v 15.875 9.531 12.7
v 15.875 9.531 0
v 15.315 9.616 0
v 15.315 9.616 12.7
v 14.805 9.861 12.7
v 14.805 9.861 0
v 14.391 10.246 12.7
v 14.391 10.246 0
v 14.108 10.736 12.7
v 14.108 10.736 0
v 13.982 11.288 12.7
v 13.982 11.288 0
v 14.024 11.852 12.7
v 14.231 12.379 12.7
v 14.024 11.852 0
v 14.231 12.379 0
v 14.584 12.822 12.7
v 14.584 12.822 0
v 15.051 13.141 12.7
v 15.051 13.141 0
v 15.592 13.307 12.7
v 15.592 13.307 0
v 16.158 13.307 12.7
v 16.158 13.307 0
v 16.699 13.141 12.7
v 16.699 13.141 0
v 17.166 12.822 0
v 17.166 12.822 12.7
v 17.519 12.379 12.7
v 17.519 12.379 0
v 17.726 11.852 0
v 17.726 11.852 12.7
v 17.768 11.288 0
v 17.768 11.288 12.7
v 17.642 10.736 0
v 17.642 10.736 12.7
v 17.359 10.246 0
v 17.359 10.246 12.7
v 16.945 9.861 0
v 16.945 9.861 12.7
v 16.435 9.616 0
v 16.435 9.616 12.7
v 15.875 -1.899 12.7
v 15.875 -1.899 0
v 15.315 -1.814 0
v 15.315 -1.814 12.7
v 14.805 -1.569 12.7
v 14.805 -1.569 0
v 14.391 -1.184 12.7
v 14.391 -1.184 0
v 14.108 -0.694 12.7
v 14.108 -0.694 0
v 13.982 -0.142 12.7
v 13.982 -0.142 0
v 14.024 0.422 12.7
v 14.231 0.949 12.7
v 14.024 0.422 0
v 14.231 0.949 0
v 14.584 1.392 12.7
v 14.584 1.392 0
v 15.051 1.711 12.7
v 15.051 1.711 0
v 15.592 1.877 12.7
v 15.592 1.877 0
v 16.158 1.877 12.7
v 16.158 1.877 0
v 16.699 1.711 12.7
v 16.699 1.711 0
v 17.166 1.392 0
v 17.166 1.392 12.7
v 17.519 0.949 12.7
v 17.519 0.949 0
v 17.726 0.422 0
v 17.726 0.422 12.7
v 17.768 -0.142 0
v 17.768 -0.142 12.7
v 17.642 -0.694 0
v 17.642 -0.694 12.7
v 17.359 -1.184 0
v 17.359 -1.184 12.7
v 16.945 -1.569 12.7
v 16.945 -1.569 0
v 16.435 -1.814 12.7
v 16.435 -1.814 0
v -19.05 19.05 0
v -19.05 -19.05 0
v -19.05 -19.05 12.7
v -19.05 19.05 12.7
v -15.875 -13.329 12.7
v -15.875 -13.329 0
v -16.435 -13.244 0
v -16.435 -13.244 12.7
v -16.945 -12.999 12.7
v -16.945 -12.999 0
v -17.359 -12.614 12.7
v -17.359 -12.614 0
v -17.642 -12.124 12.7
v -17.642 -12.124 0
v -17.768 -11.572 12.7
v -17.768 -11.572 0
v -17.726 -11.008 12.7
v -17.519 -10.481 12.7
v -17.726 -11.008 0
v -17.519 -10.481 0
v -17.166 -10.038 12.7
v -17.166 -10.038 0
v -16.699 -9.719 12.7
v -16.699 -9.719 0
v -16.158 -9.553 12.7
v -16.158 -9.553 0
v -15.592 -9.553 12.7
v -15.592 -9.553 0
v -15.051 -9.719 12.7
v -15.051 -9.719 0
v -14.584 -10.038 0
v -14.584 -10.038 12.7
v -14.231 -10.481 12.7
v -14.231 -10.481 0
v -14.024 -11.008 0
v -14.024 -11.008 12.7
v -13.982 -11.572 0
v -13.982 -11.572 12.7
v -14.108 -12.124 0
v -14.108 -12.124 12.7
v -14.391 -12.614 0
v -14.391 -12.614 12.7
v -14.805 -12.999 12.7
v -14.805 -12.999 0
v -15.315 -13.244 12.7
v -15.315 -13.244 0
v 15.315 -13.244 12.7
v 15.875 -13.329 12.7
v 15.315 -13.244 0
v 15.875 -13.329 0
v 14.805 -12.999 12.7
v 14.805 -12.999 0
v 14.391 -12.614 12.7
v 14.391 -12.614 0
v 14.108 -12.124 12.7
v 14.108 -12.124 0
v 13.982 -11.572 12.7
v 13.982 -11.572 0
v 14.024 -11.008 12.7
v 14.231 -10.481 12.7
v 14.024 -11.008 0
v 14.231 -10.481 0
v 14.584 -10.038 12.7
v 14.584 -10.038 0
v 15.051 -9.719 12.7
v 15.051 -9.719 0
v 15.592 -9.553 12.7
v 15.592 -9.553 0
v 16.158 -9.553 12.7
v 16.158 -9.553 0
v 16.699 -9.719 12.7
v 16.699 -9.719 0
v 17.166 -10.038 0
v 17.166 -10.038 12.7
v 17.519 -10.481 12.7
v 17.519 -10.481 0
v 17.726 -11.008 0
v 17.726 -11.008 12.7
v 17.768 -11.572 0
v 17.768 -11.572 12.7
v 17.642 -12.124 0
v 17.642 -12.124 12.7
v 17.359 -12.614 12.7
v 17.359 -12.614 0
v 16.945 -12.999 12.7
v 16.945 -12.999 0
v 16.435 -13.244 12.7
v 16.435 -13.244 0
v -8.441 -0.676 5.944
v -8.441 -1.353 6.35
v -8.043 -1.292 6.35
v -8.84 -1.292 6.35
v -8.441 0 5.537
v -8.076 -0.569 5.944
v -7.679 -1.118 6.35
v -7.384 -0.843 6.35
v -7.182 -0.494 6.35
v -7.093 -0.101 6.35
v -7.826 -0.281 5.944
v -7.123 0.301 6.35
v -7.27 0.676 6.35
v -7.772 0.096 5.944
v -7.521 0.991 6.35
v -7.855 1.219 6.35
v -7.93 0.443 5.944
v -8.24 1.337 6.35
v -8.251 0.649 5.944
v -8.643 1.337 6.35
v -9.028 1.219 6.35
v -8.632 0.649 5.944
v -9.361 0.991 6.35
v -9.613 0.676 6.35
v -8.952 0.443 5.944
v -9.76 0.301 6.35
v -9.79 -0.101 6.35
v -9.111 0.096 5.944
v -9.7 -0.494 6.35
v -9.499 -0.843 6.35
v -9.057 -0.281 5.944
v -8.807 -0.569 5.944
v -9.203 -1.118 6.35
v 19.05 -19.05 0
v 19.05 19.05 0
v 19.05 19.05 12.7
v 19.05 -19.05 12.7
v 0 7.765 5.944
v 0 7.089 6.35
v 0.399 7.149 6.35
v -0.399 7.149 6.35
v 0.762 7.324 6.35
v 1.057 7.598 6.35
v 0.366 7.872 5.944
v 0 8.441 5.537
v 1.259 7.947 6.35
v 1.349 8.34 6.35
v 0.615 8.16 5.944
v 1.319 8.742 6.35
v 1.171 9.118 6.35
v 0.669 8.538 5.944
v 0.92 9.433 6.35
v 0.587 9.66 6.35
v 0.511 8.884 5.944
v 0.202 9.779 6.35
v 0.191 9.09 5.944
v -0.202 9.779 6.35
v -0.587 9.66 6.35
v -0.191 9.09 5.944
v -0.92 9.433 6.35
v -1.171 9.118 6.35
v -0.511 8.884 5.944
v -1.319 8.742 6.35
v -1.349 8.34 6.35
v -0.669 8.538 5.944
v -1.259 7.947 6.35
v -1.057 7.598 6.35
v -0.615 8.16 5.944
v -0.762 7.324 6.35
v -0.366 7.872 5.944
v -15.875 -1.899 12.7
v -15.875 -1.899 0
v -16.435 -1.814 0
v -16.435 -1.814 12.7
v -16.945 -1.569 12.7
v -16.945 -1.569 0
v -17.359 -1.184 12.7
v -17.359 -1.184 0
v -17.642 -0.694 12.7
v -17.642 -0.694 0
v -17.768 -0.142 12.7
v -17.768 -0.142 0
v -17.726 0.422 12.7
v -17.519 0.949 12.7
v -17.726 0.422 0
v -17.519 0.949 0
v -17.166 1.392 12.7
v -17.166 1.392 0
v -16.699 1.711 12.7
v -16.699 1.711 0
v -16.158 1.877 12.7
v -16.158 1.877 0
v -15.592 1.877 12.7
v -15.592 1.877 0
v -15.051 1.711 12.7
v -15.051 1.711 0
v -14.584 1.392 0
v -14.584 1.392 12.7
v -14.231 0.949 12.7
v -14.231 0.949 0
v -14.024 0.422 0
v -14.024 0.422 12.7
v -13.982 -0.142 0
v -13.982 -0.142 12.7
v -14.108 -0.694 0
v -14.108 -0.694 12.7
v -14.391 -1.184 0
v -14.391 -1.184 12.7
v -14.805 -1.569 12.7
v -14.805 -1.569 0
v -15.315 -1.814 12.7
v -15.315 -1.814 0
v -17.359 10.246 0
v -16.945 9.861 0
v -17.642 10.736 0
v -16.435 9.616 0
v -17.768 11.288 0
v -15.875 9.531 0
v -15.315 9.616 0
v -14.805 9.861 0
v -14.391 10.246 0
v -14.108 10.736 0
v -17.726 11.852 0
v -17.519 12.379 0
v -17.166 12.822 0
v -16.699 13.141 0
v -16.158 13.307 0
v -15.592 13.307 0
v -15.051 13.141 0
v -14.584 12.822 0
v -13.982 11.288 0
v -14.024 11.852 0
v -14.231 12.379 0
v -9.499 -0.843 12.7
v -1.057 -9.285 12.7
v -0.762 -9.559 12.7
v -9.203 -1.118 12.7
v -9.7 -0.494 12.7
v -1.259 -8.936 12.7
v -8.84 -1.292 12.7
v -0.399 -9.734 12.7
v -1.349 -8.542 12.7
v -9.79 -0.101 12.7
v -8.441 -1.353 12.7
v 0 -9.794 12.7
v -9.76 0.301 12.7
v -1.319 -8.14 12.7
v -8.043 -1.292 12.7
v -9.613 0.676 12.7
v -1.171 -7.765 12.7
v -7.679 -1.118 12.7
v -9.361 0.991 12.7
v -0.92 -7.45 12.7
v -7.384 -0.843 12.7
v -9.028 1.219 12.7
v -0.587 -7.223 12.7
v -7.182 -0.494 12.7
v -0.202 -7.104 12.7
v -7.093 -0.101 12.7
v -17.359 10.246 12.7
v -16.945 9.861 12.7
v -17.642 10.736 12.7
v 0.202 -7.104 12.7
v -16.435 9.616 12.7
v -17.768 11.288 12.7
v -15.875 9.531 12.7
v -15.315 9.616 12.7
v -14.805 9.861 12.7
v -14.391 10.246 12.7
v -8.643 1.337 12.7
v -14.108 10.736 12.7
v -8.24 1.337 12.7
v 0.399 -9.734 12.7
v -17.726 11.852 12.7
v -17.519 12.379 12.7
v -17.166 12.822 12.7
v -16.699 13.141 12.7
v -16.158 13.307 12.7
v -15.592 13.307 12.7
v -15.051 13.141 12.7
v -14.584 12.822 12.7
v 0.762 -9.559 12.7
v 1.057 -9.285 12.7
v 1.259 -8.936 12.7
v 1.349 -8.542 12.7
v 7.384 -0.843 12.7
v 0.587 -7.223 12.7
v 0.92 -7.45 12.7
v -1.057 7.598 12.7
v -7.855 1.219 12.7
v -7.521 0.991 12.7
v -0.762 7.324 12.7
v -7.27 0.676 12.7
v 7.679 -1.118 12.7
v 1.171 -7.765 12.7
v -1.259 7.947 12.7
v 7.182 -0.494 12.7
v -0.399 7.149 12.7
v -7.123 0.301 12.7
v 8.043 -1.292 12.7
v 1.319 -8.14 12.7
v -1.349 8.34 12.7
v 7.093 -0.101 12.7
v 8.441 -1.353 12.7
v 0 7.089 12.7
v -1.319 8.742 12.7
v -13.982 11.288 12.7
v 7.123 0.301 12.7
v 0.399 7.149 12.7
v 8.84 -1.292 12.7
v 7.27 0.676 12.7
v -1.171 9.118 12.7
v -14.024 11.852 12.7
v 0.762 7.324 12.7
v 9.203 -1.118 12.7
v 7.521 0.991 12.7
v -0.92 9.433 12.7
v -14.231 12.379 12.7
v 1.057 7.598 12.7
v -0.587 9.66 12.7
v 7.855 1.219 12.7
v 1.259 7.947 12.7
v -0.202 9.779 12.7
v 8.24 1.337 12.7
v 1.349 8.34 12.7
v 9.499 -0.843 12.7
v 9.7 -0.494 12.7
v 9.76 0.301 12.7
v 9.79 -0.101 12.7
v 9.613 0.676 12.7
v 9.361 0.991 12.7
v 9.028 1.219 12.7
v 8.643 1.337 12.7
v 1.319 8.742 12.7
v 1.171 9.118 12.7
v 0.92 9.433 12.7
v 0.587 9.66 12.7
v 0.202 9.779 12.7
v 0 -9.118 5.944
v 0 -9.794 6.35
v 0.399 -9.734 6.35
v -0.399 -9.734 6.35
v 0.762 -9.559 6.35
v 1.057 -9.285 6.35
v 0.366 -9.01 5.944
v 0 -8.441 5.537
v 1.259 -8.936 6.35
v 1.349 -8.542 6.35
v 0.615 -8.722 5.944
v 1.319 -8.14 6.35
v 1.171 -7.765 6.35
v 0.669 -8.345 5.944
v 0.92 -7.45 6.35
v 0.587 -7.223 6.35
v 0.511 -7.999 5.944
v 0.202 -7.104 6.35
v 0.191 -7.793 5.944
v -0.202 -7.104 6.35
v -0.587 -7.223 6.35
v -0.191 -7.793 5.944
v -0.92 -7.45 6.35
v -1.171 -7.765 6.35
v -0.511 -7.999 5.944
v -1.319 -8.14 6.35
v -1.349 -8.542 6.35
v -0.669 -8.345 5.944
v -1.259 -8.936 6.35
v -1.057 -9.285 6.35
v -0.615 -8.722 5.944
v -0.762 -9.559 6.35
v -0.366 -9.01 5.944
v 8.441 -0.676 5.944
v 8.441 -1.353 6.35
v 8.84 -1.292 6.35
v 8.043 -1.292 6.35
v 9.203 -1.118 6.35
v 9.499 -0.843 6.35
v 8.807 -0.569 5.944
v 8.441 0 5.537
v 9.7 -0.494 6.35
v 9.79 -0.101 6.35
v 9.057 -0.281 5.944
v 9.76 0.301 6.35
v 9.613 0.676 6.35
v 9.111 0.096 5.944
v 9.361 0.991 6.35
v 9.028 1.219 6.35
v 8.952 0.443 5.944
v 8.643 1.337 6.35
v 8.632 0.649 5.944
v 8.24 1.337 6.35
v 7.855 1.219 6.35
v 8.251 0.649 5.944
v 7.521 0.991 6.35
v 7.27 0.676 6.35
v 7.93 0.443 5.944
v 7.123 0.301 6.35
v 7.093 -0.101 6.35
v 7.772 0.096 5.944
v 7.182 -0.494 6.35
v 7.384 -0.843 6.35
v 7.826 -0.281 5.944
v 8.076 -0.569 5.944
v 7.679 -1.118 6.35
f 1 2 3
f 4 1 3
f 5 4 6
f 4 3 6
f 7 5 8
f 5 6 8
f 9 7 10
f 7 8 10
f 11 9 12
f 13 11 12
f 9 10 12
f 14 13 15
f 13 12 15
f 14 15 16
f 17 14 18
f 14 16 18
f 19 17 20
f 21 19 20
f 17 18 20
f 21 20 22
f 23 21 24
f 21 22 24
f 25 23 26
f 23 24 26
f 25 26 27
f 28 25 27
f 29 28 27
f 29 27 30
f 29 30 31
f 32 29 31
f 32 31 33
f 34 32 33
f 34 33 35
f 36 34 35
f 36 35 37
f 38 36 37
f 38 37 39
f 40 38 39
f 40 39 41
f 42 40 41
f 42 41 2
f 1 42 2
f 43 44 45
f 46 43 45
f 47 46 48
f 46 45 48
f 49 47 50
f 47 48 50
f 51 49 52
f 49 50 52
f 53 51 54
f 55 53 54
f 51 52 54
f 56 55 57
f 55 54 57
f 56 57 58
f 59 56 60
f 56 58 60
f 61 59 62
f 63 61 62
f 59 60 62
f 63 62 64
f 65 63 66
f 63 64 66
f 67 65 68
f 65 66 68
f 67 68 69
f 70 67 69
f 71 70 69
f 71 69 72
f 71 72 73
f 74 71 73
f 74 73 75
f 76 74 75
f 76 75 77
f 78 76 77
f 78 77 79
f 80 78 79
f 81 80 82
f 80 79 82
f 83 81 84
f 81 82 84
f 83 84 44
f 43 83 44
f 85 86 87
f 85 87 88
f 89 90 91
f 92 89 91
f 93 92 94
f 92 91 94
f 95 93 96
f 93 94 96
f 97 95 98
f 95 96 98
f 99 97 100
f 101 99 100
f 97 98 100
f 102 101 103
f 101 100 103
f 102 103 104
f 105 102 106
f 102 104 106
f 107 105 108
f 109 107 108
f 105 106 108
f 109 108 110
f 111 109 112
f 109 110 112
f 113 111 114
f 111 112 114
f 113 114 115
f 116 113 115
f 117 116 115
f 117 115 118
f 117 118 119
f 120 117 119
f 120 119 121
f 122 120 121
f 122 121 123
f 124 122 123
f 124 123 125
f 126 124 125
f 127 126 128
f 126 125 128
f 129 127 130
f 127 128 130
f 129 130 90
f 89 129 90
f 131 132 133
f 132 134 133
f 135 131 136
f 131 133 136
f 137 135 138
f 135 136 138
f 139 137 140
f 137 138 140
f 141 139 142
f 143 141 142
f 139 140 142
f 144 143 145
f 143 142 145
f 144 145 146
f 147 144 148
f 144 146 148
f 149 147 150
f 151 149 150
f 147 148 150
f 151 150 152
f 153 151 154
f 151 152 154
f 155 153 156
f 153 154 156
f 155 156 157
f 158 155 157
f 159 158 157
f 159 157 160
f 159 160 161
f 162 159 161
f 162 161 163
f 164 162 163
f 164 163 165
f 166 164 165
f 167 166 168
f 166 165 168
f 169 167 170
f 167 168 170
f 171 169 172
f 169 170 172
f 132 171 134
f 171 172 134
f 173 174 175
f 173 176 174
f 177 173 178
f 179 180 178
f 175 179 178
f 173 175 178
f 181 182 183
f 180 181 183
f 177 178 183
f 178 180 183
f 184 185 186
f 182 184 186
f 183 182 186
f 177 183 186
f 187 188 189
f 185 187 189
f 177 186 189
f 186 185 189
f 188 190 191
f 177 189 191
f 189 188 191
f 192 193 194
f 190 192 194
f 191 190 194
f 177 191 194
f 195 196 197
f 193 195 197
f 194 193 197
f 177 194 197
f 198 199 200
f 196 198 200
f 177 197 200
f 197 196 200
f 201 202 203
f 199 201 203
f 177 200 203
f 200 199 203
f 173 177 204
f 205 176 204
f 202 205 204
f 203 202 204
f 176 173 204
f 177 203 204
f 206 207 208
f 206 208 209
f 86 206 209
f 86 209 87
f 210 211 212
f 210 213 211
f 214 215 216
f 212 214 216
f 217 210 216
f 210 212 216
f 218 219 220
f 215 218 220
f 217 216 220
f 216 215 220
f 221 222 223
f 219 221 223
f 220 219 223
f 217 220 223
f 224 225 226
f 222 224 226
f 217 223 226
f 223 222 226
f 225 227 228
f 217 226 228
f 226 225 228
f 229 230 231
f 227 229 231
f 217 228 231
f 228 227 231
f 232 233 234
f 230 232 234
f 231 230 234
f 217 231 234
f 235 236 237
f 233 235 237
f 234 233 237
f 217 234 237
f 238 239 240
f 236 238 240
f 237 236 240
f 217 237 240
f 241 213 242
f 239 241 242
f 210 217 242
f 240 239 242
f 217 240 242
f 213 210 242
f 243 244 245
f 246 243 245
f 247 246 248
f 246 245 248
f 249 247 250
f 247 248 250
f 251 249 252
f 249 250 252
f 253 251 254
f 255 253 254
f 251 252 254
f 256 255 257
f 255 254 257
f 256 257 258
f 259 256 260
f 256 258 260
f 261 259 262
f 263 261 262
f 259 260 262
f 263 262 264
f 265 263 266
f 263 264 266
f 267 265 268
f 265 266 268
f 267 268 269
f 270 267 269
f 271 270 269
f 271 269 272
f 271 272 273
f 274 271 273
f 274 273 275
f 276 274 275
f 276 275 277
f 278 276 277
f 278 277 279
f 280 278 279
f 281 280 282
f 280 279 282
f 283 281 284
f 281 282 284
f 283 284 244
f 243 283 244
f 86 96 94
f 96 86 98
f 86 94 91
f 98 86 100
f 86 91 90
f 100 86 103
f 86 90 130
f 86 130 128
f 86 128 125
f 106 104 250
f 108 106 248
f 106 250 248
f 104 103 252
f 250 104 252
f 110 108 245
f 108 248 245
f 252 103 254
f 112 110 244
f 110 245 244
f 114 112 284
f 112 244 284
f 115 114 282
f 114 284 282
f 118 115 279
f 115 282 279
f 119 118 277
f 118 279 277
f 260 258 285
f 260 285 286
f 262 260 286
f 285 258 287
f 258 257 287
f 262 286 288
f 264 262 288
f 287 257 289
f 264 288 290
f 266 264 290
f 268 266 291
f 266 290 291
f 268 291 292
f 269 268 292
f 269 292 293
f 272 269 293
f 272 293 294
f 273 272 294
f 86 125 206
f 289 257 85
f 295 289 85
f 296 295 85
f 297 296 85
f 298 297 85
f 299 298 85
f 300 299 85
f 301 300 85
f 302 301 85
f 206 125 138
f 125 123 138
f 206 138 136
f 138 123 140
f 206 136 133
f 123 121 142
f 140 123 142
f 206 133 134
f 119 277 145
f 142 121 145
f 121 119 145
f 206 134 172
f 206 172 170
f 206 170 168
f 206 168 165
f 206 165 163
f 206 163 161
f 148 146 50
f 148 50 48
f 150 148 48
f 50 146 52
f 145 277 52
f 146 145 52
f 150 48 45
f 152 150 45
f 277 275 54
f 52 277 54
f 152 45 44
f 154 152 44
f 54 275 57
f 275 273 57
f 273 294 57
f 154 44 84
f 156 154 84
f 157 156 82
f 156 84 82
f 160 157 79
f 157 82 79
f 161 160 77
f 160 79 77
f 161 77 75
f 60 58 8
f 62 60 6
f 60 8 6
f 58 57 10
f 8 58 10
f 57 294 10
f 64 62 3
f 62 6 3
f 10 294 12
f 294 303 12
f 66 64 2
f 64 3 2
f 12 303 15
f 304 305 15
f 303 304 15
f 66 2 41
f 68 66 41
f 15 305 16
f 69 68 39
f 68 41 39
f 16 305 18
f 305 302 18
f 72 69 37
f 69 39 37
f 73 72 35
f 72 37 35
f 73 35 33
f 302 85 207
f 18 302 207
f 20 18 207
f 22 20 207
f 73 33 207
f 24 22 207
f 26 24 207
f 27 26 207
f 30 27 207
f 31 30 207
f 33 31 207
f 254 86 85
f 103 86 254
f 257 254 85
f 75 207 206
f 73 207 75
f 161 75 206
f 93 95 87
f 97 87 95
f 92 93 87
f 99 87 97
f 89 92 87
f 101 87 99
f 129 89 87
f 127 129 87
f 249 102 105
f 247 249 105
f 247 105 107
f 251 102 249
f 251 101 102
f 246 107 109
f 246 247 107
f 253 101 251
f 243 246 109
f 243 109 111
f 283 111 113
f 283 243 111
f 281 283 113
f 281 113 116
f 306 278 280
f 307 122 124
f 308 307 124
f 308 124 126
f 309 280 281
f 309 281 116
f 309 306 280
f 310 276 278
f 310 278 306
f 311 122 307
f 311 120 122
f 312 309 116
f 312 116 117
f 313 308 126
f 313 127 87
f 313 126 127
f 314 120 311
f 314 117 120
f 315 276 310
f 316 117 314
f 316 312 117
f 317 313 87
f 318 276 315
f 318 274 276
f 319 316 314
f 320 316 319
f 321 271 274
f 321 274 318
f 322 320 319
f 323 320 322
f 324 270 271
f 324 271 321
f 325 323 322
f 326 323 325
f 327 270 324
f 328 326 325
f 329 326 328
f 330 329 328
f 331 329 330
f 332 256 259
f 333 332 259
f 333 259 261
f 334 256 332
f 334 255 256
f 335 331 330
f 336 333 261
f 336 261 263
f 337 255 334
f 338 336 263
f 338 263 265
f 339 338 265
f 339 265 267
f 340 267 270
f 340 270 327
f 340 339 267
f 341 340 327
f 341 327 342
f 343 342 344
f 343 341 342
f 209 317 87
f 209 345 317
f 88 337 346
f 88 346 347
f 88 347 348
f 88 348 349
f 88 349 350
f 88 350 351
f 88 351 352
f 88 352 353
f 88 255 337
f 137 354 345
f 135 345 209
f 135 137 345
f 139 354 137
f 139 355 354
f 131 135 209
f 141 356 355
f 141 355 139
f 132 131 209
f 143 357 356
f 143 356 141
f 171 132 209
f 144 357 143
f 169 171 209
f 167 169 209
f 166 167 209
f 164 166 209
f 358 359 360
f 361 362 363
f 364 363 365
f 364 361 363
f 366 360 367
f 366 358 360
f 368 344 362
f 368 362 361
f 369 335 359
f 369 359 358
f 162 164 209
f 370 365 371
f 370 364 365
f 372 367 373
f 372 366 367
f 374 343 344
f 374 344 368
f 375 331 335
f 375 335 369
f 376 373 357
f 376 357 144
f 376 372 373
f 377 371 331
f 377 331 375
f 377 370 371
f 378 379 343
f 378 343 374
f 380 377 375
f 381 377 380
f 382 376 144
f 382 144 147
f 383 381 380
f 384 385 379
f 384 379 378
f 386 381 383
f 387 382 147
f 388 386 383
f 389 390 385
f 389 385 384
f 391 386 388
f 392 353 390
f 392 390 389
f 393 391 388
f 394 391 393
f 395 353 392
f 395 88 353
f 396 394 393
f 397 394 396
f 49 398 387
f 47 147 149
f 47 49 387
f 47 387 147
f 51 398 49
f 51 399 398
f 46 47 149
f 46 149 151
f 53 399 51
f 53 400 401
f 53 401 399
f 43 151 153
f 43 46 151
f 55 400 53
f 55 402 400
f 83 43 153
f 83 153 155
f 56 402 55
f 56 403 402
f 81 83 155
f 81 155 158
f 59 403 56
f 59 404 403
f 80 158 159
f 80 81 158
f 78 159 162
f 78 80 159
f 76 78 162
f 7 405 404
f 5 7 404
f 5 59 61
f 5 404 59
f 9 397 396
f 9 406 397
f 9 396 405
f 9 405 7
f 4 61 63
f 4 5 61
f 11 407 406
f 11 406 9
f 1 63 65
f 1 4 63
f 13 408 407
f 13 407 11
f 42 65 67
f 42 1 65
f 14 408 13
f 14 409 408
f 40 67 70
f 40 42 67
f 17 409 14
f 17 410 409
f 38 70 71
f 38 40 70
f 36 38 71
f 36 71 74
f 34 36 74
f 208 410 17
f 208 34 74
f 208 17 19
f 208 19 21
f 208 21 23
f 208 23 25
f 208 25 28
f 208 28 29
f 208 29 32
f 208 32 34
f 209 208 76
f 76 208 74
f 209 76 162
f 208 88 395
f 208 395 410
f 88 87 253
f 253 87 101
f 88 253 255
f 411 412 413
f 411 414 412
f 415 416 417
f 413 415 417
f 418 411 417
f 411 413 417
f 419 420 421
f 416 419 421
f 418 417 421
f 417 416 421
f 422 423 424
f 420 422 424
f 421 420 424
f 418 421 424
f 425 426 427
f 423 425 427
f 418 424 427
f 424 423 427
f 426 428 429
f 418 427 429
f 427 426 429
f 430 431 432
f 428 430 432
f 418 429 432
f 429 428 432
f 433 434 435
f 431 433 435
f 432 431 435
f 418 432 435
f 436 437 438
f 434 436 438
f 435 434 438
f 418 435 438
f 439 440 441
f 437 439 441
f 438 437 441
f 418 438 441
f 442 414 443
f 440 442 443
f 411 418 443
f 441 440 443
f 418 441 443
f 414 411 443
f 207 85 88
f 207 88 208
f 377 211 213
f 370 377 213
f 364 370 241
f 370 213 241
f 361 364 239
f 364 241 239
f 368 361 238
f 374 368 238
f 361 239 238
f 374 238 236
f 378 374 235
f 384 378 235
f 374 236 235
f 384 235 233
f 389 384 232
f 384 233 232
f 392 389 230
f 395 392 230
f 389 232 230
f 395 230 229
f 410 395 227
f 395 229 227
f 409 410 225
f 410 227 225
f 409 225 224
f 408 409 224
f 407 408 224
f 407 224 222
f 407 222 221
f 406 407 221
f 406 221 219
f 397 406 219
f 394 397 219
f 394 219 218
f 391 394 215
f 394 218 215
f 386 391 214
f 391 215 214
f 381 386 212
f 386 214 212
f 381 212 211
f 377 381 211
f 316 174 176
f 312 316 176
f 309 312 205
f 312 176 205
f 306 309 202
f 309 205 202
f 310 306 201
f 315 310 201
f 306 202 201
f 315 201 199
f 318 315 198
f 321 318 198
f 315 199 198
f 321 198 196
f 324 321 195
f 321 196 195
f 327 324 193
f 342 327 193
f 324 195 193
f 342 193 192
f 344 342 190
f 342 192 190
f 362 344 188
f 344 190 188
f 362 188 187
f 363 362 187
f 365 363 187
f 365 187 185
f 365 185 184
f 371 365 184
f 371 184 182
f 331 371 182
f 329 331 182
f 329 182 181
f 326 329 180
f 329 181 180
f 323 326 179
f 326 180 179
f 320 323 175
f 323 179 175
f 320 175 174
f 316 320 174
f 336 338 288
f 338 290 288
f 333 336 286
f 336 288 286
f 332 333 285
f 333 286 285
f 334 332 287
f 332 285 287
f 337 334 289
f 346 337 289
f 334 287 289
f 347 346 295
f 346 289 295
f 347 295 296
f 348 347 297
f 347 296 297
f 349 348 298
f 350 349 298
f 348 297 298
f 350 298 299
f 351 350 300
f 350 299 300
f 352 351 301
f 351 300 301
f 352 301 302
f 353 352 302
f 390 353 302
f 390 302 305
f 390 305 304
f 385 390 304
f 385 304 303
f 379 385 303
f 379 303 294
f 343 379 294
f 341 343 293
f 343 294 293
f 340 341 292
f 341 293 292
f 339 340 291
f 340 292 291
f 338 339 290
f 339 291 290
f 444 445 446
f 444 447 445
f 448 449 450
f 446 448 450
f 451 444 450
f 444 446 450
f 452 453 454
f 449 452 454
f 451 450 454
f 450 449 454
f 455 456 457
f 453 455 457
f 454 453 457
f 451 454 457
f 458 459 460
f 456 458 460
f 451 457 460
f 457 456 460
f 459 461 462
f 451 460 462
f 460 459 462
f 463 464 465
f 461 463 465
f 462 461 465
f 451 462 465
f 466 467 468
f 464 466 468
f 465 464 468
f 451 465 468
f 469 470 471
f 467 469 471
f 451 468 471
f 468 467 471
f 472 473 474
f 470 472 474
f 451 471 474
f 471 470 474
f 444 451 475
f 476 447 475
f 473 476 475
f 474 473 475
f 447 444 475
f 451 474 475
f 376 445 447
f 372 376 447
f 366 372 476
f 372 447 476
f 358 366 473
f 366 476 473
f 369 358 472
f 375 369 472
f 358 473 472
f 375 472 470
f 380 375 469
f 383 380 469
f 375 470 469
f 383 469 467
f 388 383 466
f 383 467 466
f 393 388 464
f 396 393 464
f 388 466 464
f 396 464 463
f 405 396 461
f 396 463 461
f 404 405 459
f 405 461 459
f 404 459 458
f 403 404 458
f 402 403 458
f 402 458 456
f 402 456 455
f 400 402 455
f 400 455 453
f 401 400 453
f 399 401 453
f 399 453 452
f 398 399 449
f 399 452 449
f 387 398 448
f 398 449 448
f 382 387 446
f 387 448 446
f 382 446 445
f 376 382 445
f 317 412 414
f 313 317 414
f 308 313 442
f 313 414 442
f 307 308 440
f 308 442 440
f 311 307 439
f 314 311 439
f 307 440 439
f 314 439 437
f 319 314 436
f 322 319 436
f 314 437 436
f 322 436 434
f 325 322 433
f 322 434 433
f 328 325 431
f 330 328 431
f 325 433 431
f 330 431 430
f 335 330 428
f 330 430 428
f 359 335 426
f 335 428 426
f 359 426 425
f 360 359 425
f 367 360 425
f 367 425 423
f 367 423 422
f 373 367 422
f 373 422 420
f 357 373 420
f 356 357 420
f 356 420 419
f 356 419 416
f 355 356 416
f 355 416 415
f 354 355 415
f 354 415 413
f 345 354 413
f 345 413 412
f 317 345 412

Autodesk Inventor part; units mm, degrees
ref_plane "YZ Plane" through (0, 0, 0) normal (1, 0, 0) x (0, 1, 0)
ref_plane "XZ Plane" through (0, 0, 0) normal (0, 1, 0) x (-1, 0, 0)
ref_plane "XY Plane" through (0, 0, 0) normal (0, 0, 1) x (1, 0, 0)
sketch "Sketch1" plane through (0, 0, 0) normal (0, 0, 1) x (1, 0, 0)
  line L0 (19.05, -19.05) -> (-19.05, -19.05)
  line L1 (-19.05, -19.05) -> (-19.05, 19.05)
  line L2 (-19.05, 19.05) -> (19.05, 19.05)
  line L3 (19.05, 19.05) -> (19.05, -19.05)
  line L4 (19.05, -19.05) -> (-19.05, 19.05) construction
  line L5 (-19.05, -19.05) -> (19.05, 19.05) construction
  point P0 (0, 0)
  dimension "d0" = 38.1
  dimension "d1" = 38.1
extrude "Extrusion1" add sketch "Sketch1" along normal blind 12.7
sketch "Sketch4" plane through (0, 0, 12.7) normal (0, 0, 1) x (1, 0, 0)
  point P0 (0, 0)
sketch "Sketch5" plane through (0, 0, 12.7) normal (0, 0, 1) x (1, 0, 0)
  line L0 (-19.05, -19.05) -> (19.05, -19.05) construction
  line L1 (19.05, -19.05) -> (19.05, 19.05) construction
  line L2 (19.05, 19.05) -> (-19.05, 19.05) construction
  line L3 (-19.05, 19.05) -> (-19.05, -19.05) construction
  line L4 (15.875, -11.43) -> (-15.875, -11.43) construction
  line L5 (-15.875, -11.43) -> (-15.875, 11.43) construction
  line L6 (-15.875, 11.43) -> (15.875, 11.43) construction
  line L7 (15.875, 11.43) -> (15.875, -11.43) construction
  line L8 (15.875, -11.43) -> (-15.875, 11.43) construction
  line L9 (-15.875, -11.43) -> (15.875, 11.43) construction
  line L10 (11.43, -15.875) -> (-11.43, -15.875) construction
  line L11 (-11.43, -15.875) -> (-11.43, 15.875) construction
  line L12 (-11.43, 15.875) -> (11.43, 15.875) construction
  line L13 (11.43, 15.875) -> (11.43, -15.875) construction
  line L14 (11.43, -15.875) -> (-11.43, 15.875) construction
  line L15 (-11.43, -15.875) -> (11.43, 15.875) construction
  line L16 (0, -8.4414) -> (8.4414, 0) construction
  line L17 (8.4414, 0) -> (0, 8.4414) construction
  line L18 (0, 8.4414) -> (-8.4414, 0) construction
  line L19 (-8.4414, 0) -> (0, -8.4414) construction
  line L20 (-5.969, -5.969) -> (5.969, 5.969) construction
  line L21 (5.969, -5.969) -> (-5.969, 5.969) construction
  line L22 (-8.4414, -8.4414) -> (8.4414, -8.4414) construction
  line L23 (8.4414, -8.4414) -> (8.4414, 8.4414) construction
  line L24 (8.4414, 8.4414) -> (-8.4414, 8.4414) construction
  line L25 (-8.4414, 8.4414) -> (-8.4414, -8.4414) construction
  line L26 (-8.4414, -8.4414) -> (8.4414, 8.4414) construction
  line L27 (8.4414, -8.4414) -> (-8.4414, 8.4414) construction
  point P0 (0, 0)
  point P1 (0, 8.4414)
  point P2 (8.4414, 0)
  point P3 (-15.875, 0)
  point P4 (15.875, 0)
  point P5 (-15.875, 0)
  point P6 (-15.875, 0)
  point P7 (15.875, 0)
  dimension "d46" = 31.75
  dimension "d47" = 22.86
  dimension "d48" = 22.86
  dimension "d49" = 31.75
  dimension "d50" = 11.938
  dimension "d51" = 11.938
  dimension "d52" = 16.8829
  dimension "d53" = 16.8829
  dimension "d54" = 4.445
  dimension "d55" = 7.4336
  dimension "d56" = 5.969
  dimension "d57" = 5.969
  dimension "d58" = 4.445
  dimension "d59" = 7.4336
  dimension "d60" = 9.906
  dimension "d61" = 9.906
  dimension "d62" = 21.844
  dimension "d63" = 21.844
  dimension "d64" = 3.175
  dimension "d65" = 3.175
hole "Hole2" at (-15.875, -11.43, 12.7) at (15.875, -11.43, 12.7) at (15.875, 0, 12.7) at (-15.875, 0, 12.7) at (-15.875, 11.43, 12.7) at (15.875, 11.43, 12.7) direction (0, 0, -1) diameter 3.7973 end through all
sketch "Sketch6" plane through (0, 0, 12.7) normal (0, 0, 1) x (1, 0, 0)
  circle A0 centre (-15.875, 11.43) radius 1.8986 construction
  circle A1 centre (15.875, 0) radius 1.8986 construction
  circle A2 centre (-15.875, -11.43) radius 1.8986 construction
  circle A3 centre (15.875, -11.43) radius 1.8986 construction
  circle A4 centre (-15.875, 0) radius 1.8986 construction
  circle A5 centre (15.875, 11.43) radius 1.8986 construction
  line L0 (-19.05, -19.05) -> (19.05, -19.05) construction
  line L1 (19.05, -19.05) -> (19.05, 19.05) construction
  line L2 (19.05, 19.05) -> (-19.05, 19.05) construction
  line L3 (-19.05, 19.05) -> (-19.05, -19.05) construction
  line L4 (15.875, -11.43) -> (-15.875, -11.43) construction
  line L5 (-15.875, -11.43) -> (-15.875, 11.43) construction
  line L6 (-15.875, 11.43) -> (15.875, 11.43) construction
  line L7 (15.875, 11.43) -> (15.875, -11.43) construction
  line L8 (15.875, -11.43) -> (-15.875, 11.43) construction
  line L9 (-15.875, -11.43) -> (15.875, 11.43) construction
  line L10 (11.43, -15.875) -> (-11.43, -15.875) construction
  line L11 (-11.43, -15.875) -> (-11.43, 15.875) construction
  line L12 (-11.43, 15.875) -> (11.43, 15.875) construction
  line L13 (11.43, 15.875) -> (11.43, -15.875) construction
  line L14 (11.43, -15.875) -> (-11.43, 15.875) construction
  line L15 (-11.43, -15.875) -> (11.43, 15.875) construction
  line L16 (0, -8.4414) -> (8.4414, 0) construction
  line L17 (8.4414, 0) -> (0, 8.4414) construction
  line L18 (0, 8.4414) -> (-8.4414, 0) construction
  line L19 (-8.4414, 0) -> (0, -8.4414) construction
  line L20 (-5.969, -5.969) -> (5.969, 5.969) construction
  line L21 (5.969, -5.969) -> (-5.969, 5.969) construction
  line L22 (-8.4414, -8.4414) -> (8.4414, -8.4414) construction
  line L23 (8.4414, -8.4414) -> (8.4414, 8.4414) construction
  line L24 (8.4414, 8.4414) -> (-8.4414, 8.4414) construction
  line L25 (-8.4414, 8.4414) -> (-8.4414, -8.4414) construction
  line L26 (-8.4414, -8.4414) -> (8.4414, 8.4414) construction
  line L27 (8.4414, -8.4414) -> (-8.4414, 8.4414) construction
  point P0 (0, 0)
  point P1 (0, 8.4414)
  point P2 (8.4414, 0)
  point P3 (8.4414, 0)
  dimension "d73" = 31.75
  dimension "d74" = 22.86
  dimension "d75" = 22.86
  dimension "d76" = 31.75
  dimension "d77" = 11.938
  dimension "d78" = 11.938
  dimension "d79" = 16.8829
  dimension "d80" = 16.8829
  dimension "d81" = 4.445
  dimension "d82" = 7.4336
  dimension "d83" = 5.969
  dimension "d84" = 5.969
  dimension "d85" = 4.445
  dimension "d86" = 7.4336
  dimension "d87" = 9.906
  dimension "d88" = 9.906
  dimension "d89" = 21.844
  dimension "d90" = 21.844
  dimension "d91" = 3.175
  dimension "d92" = 3.175
hole "Hole3" at (-8.4414, 0, 12.7) at (0, 8.4414, 12.7) at (8.4414, 0, 12.7) at (0, -8.4414, 12.7) direction (0, 0, -1) diameter 2.7051 depth 6.35 tip angle 118
properties part number "goniometer_stage_standoff_v1" material "Stainless Steel AISI 304"
